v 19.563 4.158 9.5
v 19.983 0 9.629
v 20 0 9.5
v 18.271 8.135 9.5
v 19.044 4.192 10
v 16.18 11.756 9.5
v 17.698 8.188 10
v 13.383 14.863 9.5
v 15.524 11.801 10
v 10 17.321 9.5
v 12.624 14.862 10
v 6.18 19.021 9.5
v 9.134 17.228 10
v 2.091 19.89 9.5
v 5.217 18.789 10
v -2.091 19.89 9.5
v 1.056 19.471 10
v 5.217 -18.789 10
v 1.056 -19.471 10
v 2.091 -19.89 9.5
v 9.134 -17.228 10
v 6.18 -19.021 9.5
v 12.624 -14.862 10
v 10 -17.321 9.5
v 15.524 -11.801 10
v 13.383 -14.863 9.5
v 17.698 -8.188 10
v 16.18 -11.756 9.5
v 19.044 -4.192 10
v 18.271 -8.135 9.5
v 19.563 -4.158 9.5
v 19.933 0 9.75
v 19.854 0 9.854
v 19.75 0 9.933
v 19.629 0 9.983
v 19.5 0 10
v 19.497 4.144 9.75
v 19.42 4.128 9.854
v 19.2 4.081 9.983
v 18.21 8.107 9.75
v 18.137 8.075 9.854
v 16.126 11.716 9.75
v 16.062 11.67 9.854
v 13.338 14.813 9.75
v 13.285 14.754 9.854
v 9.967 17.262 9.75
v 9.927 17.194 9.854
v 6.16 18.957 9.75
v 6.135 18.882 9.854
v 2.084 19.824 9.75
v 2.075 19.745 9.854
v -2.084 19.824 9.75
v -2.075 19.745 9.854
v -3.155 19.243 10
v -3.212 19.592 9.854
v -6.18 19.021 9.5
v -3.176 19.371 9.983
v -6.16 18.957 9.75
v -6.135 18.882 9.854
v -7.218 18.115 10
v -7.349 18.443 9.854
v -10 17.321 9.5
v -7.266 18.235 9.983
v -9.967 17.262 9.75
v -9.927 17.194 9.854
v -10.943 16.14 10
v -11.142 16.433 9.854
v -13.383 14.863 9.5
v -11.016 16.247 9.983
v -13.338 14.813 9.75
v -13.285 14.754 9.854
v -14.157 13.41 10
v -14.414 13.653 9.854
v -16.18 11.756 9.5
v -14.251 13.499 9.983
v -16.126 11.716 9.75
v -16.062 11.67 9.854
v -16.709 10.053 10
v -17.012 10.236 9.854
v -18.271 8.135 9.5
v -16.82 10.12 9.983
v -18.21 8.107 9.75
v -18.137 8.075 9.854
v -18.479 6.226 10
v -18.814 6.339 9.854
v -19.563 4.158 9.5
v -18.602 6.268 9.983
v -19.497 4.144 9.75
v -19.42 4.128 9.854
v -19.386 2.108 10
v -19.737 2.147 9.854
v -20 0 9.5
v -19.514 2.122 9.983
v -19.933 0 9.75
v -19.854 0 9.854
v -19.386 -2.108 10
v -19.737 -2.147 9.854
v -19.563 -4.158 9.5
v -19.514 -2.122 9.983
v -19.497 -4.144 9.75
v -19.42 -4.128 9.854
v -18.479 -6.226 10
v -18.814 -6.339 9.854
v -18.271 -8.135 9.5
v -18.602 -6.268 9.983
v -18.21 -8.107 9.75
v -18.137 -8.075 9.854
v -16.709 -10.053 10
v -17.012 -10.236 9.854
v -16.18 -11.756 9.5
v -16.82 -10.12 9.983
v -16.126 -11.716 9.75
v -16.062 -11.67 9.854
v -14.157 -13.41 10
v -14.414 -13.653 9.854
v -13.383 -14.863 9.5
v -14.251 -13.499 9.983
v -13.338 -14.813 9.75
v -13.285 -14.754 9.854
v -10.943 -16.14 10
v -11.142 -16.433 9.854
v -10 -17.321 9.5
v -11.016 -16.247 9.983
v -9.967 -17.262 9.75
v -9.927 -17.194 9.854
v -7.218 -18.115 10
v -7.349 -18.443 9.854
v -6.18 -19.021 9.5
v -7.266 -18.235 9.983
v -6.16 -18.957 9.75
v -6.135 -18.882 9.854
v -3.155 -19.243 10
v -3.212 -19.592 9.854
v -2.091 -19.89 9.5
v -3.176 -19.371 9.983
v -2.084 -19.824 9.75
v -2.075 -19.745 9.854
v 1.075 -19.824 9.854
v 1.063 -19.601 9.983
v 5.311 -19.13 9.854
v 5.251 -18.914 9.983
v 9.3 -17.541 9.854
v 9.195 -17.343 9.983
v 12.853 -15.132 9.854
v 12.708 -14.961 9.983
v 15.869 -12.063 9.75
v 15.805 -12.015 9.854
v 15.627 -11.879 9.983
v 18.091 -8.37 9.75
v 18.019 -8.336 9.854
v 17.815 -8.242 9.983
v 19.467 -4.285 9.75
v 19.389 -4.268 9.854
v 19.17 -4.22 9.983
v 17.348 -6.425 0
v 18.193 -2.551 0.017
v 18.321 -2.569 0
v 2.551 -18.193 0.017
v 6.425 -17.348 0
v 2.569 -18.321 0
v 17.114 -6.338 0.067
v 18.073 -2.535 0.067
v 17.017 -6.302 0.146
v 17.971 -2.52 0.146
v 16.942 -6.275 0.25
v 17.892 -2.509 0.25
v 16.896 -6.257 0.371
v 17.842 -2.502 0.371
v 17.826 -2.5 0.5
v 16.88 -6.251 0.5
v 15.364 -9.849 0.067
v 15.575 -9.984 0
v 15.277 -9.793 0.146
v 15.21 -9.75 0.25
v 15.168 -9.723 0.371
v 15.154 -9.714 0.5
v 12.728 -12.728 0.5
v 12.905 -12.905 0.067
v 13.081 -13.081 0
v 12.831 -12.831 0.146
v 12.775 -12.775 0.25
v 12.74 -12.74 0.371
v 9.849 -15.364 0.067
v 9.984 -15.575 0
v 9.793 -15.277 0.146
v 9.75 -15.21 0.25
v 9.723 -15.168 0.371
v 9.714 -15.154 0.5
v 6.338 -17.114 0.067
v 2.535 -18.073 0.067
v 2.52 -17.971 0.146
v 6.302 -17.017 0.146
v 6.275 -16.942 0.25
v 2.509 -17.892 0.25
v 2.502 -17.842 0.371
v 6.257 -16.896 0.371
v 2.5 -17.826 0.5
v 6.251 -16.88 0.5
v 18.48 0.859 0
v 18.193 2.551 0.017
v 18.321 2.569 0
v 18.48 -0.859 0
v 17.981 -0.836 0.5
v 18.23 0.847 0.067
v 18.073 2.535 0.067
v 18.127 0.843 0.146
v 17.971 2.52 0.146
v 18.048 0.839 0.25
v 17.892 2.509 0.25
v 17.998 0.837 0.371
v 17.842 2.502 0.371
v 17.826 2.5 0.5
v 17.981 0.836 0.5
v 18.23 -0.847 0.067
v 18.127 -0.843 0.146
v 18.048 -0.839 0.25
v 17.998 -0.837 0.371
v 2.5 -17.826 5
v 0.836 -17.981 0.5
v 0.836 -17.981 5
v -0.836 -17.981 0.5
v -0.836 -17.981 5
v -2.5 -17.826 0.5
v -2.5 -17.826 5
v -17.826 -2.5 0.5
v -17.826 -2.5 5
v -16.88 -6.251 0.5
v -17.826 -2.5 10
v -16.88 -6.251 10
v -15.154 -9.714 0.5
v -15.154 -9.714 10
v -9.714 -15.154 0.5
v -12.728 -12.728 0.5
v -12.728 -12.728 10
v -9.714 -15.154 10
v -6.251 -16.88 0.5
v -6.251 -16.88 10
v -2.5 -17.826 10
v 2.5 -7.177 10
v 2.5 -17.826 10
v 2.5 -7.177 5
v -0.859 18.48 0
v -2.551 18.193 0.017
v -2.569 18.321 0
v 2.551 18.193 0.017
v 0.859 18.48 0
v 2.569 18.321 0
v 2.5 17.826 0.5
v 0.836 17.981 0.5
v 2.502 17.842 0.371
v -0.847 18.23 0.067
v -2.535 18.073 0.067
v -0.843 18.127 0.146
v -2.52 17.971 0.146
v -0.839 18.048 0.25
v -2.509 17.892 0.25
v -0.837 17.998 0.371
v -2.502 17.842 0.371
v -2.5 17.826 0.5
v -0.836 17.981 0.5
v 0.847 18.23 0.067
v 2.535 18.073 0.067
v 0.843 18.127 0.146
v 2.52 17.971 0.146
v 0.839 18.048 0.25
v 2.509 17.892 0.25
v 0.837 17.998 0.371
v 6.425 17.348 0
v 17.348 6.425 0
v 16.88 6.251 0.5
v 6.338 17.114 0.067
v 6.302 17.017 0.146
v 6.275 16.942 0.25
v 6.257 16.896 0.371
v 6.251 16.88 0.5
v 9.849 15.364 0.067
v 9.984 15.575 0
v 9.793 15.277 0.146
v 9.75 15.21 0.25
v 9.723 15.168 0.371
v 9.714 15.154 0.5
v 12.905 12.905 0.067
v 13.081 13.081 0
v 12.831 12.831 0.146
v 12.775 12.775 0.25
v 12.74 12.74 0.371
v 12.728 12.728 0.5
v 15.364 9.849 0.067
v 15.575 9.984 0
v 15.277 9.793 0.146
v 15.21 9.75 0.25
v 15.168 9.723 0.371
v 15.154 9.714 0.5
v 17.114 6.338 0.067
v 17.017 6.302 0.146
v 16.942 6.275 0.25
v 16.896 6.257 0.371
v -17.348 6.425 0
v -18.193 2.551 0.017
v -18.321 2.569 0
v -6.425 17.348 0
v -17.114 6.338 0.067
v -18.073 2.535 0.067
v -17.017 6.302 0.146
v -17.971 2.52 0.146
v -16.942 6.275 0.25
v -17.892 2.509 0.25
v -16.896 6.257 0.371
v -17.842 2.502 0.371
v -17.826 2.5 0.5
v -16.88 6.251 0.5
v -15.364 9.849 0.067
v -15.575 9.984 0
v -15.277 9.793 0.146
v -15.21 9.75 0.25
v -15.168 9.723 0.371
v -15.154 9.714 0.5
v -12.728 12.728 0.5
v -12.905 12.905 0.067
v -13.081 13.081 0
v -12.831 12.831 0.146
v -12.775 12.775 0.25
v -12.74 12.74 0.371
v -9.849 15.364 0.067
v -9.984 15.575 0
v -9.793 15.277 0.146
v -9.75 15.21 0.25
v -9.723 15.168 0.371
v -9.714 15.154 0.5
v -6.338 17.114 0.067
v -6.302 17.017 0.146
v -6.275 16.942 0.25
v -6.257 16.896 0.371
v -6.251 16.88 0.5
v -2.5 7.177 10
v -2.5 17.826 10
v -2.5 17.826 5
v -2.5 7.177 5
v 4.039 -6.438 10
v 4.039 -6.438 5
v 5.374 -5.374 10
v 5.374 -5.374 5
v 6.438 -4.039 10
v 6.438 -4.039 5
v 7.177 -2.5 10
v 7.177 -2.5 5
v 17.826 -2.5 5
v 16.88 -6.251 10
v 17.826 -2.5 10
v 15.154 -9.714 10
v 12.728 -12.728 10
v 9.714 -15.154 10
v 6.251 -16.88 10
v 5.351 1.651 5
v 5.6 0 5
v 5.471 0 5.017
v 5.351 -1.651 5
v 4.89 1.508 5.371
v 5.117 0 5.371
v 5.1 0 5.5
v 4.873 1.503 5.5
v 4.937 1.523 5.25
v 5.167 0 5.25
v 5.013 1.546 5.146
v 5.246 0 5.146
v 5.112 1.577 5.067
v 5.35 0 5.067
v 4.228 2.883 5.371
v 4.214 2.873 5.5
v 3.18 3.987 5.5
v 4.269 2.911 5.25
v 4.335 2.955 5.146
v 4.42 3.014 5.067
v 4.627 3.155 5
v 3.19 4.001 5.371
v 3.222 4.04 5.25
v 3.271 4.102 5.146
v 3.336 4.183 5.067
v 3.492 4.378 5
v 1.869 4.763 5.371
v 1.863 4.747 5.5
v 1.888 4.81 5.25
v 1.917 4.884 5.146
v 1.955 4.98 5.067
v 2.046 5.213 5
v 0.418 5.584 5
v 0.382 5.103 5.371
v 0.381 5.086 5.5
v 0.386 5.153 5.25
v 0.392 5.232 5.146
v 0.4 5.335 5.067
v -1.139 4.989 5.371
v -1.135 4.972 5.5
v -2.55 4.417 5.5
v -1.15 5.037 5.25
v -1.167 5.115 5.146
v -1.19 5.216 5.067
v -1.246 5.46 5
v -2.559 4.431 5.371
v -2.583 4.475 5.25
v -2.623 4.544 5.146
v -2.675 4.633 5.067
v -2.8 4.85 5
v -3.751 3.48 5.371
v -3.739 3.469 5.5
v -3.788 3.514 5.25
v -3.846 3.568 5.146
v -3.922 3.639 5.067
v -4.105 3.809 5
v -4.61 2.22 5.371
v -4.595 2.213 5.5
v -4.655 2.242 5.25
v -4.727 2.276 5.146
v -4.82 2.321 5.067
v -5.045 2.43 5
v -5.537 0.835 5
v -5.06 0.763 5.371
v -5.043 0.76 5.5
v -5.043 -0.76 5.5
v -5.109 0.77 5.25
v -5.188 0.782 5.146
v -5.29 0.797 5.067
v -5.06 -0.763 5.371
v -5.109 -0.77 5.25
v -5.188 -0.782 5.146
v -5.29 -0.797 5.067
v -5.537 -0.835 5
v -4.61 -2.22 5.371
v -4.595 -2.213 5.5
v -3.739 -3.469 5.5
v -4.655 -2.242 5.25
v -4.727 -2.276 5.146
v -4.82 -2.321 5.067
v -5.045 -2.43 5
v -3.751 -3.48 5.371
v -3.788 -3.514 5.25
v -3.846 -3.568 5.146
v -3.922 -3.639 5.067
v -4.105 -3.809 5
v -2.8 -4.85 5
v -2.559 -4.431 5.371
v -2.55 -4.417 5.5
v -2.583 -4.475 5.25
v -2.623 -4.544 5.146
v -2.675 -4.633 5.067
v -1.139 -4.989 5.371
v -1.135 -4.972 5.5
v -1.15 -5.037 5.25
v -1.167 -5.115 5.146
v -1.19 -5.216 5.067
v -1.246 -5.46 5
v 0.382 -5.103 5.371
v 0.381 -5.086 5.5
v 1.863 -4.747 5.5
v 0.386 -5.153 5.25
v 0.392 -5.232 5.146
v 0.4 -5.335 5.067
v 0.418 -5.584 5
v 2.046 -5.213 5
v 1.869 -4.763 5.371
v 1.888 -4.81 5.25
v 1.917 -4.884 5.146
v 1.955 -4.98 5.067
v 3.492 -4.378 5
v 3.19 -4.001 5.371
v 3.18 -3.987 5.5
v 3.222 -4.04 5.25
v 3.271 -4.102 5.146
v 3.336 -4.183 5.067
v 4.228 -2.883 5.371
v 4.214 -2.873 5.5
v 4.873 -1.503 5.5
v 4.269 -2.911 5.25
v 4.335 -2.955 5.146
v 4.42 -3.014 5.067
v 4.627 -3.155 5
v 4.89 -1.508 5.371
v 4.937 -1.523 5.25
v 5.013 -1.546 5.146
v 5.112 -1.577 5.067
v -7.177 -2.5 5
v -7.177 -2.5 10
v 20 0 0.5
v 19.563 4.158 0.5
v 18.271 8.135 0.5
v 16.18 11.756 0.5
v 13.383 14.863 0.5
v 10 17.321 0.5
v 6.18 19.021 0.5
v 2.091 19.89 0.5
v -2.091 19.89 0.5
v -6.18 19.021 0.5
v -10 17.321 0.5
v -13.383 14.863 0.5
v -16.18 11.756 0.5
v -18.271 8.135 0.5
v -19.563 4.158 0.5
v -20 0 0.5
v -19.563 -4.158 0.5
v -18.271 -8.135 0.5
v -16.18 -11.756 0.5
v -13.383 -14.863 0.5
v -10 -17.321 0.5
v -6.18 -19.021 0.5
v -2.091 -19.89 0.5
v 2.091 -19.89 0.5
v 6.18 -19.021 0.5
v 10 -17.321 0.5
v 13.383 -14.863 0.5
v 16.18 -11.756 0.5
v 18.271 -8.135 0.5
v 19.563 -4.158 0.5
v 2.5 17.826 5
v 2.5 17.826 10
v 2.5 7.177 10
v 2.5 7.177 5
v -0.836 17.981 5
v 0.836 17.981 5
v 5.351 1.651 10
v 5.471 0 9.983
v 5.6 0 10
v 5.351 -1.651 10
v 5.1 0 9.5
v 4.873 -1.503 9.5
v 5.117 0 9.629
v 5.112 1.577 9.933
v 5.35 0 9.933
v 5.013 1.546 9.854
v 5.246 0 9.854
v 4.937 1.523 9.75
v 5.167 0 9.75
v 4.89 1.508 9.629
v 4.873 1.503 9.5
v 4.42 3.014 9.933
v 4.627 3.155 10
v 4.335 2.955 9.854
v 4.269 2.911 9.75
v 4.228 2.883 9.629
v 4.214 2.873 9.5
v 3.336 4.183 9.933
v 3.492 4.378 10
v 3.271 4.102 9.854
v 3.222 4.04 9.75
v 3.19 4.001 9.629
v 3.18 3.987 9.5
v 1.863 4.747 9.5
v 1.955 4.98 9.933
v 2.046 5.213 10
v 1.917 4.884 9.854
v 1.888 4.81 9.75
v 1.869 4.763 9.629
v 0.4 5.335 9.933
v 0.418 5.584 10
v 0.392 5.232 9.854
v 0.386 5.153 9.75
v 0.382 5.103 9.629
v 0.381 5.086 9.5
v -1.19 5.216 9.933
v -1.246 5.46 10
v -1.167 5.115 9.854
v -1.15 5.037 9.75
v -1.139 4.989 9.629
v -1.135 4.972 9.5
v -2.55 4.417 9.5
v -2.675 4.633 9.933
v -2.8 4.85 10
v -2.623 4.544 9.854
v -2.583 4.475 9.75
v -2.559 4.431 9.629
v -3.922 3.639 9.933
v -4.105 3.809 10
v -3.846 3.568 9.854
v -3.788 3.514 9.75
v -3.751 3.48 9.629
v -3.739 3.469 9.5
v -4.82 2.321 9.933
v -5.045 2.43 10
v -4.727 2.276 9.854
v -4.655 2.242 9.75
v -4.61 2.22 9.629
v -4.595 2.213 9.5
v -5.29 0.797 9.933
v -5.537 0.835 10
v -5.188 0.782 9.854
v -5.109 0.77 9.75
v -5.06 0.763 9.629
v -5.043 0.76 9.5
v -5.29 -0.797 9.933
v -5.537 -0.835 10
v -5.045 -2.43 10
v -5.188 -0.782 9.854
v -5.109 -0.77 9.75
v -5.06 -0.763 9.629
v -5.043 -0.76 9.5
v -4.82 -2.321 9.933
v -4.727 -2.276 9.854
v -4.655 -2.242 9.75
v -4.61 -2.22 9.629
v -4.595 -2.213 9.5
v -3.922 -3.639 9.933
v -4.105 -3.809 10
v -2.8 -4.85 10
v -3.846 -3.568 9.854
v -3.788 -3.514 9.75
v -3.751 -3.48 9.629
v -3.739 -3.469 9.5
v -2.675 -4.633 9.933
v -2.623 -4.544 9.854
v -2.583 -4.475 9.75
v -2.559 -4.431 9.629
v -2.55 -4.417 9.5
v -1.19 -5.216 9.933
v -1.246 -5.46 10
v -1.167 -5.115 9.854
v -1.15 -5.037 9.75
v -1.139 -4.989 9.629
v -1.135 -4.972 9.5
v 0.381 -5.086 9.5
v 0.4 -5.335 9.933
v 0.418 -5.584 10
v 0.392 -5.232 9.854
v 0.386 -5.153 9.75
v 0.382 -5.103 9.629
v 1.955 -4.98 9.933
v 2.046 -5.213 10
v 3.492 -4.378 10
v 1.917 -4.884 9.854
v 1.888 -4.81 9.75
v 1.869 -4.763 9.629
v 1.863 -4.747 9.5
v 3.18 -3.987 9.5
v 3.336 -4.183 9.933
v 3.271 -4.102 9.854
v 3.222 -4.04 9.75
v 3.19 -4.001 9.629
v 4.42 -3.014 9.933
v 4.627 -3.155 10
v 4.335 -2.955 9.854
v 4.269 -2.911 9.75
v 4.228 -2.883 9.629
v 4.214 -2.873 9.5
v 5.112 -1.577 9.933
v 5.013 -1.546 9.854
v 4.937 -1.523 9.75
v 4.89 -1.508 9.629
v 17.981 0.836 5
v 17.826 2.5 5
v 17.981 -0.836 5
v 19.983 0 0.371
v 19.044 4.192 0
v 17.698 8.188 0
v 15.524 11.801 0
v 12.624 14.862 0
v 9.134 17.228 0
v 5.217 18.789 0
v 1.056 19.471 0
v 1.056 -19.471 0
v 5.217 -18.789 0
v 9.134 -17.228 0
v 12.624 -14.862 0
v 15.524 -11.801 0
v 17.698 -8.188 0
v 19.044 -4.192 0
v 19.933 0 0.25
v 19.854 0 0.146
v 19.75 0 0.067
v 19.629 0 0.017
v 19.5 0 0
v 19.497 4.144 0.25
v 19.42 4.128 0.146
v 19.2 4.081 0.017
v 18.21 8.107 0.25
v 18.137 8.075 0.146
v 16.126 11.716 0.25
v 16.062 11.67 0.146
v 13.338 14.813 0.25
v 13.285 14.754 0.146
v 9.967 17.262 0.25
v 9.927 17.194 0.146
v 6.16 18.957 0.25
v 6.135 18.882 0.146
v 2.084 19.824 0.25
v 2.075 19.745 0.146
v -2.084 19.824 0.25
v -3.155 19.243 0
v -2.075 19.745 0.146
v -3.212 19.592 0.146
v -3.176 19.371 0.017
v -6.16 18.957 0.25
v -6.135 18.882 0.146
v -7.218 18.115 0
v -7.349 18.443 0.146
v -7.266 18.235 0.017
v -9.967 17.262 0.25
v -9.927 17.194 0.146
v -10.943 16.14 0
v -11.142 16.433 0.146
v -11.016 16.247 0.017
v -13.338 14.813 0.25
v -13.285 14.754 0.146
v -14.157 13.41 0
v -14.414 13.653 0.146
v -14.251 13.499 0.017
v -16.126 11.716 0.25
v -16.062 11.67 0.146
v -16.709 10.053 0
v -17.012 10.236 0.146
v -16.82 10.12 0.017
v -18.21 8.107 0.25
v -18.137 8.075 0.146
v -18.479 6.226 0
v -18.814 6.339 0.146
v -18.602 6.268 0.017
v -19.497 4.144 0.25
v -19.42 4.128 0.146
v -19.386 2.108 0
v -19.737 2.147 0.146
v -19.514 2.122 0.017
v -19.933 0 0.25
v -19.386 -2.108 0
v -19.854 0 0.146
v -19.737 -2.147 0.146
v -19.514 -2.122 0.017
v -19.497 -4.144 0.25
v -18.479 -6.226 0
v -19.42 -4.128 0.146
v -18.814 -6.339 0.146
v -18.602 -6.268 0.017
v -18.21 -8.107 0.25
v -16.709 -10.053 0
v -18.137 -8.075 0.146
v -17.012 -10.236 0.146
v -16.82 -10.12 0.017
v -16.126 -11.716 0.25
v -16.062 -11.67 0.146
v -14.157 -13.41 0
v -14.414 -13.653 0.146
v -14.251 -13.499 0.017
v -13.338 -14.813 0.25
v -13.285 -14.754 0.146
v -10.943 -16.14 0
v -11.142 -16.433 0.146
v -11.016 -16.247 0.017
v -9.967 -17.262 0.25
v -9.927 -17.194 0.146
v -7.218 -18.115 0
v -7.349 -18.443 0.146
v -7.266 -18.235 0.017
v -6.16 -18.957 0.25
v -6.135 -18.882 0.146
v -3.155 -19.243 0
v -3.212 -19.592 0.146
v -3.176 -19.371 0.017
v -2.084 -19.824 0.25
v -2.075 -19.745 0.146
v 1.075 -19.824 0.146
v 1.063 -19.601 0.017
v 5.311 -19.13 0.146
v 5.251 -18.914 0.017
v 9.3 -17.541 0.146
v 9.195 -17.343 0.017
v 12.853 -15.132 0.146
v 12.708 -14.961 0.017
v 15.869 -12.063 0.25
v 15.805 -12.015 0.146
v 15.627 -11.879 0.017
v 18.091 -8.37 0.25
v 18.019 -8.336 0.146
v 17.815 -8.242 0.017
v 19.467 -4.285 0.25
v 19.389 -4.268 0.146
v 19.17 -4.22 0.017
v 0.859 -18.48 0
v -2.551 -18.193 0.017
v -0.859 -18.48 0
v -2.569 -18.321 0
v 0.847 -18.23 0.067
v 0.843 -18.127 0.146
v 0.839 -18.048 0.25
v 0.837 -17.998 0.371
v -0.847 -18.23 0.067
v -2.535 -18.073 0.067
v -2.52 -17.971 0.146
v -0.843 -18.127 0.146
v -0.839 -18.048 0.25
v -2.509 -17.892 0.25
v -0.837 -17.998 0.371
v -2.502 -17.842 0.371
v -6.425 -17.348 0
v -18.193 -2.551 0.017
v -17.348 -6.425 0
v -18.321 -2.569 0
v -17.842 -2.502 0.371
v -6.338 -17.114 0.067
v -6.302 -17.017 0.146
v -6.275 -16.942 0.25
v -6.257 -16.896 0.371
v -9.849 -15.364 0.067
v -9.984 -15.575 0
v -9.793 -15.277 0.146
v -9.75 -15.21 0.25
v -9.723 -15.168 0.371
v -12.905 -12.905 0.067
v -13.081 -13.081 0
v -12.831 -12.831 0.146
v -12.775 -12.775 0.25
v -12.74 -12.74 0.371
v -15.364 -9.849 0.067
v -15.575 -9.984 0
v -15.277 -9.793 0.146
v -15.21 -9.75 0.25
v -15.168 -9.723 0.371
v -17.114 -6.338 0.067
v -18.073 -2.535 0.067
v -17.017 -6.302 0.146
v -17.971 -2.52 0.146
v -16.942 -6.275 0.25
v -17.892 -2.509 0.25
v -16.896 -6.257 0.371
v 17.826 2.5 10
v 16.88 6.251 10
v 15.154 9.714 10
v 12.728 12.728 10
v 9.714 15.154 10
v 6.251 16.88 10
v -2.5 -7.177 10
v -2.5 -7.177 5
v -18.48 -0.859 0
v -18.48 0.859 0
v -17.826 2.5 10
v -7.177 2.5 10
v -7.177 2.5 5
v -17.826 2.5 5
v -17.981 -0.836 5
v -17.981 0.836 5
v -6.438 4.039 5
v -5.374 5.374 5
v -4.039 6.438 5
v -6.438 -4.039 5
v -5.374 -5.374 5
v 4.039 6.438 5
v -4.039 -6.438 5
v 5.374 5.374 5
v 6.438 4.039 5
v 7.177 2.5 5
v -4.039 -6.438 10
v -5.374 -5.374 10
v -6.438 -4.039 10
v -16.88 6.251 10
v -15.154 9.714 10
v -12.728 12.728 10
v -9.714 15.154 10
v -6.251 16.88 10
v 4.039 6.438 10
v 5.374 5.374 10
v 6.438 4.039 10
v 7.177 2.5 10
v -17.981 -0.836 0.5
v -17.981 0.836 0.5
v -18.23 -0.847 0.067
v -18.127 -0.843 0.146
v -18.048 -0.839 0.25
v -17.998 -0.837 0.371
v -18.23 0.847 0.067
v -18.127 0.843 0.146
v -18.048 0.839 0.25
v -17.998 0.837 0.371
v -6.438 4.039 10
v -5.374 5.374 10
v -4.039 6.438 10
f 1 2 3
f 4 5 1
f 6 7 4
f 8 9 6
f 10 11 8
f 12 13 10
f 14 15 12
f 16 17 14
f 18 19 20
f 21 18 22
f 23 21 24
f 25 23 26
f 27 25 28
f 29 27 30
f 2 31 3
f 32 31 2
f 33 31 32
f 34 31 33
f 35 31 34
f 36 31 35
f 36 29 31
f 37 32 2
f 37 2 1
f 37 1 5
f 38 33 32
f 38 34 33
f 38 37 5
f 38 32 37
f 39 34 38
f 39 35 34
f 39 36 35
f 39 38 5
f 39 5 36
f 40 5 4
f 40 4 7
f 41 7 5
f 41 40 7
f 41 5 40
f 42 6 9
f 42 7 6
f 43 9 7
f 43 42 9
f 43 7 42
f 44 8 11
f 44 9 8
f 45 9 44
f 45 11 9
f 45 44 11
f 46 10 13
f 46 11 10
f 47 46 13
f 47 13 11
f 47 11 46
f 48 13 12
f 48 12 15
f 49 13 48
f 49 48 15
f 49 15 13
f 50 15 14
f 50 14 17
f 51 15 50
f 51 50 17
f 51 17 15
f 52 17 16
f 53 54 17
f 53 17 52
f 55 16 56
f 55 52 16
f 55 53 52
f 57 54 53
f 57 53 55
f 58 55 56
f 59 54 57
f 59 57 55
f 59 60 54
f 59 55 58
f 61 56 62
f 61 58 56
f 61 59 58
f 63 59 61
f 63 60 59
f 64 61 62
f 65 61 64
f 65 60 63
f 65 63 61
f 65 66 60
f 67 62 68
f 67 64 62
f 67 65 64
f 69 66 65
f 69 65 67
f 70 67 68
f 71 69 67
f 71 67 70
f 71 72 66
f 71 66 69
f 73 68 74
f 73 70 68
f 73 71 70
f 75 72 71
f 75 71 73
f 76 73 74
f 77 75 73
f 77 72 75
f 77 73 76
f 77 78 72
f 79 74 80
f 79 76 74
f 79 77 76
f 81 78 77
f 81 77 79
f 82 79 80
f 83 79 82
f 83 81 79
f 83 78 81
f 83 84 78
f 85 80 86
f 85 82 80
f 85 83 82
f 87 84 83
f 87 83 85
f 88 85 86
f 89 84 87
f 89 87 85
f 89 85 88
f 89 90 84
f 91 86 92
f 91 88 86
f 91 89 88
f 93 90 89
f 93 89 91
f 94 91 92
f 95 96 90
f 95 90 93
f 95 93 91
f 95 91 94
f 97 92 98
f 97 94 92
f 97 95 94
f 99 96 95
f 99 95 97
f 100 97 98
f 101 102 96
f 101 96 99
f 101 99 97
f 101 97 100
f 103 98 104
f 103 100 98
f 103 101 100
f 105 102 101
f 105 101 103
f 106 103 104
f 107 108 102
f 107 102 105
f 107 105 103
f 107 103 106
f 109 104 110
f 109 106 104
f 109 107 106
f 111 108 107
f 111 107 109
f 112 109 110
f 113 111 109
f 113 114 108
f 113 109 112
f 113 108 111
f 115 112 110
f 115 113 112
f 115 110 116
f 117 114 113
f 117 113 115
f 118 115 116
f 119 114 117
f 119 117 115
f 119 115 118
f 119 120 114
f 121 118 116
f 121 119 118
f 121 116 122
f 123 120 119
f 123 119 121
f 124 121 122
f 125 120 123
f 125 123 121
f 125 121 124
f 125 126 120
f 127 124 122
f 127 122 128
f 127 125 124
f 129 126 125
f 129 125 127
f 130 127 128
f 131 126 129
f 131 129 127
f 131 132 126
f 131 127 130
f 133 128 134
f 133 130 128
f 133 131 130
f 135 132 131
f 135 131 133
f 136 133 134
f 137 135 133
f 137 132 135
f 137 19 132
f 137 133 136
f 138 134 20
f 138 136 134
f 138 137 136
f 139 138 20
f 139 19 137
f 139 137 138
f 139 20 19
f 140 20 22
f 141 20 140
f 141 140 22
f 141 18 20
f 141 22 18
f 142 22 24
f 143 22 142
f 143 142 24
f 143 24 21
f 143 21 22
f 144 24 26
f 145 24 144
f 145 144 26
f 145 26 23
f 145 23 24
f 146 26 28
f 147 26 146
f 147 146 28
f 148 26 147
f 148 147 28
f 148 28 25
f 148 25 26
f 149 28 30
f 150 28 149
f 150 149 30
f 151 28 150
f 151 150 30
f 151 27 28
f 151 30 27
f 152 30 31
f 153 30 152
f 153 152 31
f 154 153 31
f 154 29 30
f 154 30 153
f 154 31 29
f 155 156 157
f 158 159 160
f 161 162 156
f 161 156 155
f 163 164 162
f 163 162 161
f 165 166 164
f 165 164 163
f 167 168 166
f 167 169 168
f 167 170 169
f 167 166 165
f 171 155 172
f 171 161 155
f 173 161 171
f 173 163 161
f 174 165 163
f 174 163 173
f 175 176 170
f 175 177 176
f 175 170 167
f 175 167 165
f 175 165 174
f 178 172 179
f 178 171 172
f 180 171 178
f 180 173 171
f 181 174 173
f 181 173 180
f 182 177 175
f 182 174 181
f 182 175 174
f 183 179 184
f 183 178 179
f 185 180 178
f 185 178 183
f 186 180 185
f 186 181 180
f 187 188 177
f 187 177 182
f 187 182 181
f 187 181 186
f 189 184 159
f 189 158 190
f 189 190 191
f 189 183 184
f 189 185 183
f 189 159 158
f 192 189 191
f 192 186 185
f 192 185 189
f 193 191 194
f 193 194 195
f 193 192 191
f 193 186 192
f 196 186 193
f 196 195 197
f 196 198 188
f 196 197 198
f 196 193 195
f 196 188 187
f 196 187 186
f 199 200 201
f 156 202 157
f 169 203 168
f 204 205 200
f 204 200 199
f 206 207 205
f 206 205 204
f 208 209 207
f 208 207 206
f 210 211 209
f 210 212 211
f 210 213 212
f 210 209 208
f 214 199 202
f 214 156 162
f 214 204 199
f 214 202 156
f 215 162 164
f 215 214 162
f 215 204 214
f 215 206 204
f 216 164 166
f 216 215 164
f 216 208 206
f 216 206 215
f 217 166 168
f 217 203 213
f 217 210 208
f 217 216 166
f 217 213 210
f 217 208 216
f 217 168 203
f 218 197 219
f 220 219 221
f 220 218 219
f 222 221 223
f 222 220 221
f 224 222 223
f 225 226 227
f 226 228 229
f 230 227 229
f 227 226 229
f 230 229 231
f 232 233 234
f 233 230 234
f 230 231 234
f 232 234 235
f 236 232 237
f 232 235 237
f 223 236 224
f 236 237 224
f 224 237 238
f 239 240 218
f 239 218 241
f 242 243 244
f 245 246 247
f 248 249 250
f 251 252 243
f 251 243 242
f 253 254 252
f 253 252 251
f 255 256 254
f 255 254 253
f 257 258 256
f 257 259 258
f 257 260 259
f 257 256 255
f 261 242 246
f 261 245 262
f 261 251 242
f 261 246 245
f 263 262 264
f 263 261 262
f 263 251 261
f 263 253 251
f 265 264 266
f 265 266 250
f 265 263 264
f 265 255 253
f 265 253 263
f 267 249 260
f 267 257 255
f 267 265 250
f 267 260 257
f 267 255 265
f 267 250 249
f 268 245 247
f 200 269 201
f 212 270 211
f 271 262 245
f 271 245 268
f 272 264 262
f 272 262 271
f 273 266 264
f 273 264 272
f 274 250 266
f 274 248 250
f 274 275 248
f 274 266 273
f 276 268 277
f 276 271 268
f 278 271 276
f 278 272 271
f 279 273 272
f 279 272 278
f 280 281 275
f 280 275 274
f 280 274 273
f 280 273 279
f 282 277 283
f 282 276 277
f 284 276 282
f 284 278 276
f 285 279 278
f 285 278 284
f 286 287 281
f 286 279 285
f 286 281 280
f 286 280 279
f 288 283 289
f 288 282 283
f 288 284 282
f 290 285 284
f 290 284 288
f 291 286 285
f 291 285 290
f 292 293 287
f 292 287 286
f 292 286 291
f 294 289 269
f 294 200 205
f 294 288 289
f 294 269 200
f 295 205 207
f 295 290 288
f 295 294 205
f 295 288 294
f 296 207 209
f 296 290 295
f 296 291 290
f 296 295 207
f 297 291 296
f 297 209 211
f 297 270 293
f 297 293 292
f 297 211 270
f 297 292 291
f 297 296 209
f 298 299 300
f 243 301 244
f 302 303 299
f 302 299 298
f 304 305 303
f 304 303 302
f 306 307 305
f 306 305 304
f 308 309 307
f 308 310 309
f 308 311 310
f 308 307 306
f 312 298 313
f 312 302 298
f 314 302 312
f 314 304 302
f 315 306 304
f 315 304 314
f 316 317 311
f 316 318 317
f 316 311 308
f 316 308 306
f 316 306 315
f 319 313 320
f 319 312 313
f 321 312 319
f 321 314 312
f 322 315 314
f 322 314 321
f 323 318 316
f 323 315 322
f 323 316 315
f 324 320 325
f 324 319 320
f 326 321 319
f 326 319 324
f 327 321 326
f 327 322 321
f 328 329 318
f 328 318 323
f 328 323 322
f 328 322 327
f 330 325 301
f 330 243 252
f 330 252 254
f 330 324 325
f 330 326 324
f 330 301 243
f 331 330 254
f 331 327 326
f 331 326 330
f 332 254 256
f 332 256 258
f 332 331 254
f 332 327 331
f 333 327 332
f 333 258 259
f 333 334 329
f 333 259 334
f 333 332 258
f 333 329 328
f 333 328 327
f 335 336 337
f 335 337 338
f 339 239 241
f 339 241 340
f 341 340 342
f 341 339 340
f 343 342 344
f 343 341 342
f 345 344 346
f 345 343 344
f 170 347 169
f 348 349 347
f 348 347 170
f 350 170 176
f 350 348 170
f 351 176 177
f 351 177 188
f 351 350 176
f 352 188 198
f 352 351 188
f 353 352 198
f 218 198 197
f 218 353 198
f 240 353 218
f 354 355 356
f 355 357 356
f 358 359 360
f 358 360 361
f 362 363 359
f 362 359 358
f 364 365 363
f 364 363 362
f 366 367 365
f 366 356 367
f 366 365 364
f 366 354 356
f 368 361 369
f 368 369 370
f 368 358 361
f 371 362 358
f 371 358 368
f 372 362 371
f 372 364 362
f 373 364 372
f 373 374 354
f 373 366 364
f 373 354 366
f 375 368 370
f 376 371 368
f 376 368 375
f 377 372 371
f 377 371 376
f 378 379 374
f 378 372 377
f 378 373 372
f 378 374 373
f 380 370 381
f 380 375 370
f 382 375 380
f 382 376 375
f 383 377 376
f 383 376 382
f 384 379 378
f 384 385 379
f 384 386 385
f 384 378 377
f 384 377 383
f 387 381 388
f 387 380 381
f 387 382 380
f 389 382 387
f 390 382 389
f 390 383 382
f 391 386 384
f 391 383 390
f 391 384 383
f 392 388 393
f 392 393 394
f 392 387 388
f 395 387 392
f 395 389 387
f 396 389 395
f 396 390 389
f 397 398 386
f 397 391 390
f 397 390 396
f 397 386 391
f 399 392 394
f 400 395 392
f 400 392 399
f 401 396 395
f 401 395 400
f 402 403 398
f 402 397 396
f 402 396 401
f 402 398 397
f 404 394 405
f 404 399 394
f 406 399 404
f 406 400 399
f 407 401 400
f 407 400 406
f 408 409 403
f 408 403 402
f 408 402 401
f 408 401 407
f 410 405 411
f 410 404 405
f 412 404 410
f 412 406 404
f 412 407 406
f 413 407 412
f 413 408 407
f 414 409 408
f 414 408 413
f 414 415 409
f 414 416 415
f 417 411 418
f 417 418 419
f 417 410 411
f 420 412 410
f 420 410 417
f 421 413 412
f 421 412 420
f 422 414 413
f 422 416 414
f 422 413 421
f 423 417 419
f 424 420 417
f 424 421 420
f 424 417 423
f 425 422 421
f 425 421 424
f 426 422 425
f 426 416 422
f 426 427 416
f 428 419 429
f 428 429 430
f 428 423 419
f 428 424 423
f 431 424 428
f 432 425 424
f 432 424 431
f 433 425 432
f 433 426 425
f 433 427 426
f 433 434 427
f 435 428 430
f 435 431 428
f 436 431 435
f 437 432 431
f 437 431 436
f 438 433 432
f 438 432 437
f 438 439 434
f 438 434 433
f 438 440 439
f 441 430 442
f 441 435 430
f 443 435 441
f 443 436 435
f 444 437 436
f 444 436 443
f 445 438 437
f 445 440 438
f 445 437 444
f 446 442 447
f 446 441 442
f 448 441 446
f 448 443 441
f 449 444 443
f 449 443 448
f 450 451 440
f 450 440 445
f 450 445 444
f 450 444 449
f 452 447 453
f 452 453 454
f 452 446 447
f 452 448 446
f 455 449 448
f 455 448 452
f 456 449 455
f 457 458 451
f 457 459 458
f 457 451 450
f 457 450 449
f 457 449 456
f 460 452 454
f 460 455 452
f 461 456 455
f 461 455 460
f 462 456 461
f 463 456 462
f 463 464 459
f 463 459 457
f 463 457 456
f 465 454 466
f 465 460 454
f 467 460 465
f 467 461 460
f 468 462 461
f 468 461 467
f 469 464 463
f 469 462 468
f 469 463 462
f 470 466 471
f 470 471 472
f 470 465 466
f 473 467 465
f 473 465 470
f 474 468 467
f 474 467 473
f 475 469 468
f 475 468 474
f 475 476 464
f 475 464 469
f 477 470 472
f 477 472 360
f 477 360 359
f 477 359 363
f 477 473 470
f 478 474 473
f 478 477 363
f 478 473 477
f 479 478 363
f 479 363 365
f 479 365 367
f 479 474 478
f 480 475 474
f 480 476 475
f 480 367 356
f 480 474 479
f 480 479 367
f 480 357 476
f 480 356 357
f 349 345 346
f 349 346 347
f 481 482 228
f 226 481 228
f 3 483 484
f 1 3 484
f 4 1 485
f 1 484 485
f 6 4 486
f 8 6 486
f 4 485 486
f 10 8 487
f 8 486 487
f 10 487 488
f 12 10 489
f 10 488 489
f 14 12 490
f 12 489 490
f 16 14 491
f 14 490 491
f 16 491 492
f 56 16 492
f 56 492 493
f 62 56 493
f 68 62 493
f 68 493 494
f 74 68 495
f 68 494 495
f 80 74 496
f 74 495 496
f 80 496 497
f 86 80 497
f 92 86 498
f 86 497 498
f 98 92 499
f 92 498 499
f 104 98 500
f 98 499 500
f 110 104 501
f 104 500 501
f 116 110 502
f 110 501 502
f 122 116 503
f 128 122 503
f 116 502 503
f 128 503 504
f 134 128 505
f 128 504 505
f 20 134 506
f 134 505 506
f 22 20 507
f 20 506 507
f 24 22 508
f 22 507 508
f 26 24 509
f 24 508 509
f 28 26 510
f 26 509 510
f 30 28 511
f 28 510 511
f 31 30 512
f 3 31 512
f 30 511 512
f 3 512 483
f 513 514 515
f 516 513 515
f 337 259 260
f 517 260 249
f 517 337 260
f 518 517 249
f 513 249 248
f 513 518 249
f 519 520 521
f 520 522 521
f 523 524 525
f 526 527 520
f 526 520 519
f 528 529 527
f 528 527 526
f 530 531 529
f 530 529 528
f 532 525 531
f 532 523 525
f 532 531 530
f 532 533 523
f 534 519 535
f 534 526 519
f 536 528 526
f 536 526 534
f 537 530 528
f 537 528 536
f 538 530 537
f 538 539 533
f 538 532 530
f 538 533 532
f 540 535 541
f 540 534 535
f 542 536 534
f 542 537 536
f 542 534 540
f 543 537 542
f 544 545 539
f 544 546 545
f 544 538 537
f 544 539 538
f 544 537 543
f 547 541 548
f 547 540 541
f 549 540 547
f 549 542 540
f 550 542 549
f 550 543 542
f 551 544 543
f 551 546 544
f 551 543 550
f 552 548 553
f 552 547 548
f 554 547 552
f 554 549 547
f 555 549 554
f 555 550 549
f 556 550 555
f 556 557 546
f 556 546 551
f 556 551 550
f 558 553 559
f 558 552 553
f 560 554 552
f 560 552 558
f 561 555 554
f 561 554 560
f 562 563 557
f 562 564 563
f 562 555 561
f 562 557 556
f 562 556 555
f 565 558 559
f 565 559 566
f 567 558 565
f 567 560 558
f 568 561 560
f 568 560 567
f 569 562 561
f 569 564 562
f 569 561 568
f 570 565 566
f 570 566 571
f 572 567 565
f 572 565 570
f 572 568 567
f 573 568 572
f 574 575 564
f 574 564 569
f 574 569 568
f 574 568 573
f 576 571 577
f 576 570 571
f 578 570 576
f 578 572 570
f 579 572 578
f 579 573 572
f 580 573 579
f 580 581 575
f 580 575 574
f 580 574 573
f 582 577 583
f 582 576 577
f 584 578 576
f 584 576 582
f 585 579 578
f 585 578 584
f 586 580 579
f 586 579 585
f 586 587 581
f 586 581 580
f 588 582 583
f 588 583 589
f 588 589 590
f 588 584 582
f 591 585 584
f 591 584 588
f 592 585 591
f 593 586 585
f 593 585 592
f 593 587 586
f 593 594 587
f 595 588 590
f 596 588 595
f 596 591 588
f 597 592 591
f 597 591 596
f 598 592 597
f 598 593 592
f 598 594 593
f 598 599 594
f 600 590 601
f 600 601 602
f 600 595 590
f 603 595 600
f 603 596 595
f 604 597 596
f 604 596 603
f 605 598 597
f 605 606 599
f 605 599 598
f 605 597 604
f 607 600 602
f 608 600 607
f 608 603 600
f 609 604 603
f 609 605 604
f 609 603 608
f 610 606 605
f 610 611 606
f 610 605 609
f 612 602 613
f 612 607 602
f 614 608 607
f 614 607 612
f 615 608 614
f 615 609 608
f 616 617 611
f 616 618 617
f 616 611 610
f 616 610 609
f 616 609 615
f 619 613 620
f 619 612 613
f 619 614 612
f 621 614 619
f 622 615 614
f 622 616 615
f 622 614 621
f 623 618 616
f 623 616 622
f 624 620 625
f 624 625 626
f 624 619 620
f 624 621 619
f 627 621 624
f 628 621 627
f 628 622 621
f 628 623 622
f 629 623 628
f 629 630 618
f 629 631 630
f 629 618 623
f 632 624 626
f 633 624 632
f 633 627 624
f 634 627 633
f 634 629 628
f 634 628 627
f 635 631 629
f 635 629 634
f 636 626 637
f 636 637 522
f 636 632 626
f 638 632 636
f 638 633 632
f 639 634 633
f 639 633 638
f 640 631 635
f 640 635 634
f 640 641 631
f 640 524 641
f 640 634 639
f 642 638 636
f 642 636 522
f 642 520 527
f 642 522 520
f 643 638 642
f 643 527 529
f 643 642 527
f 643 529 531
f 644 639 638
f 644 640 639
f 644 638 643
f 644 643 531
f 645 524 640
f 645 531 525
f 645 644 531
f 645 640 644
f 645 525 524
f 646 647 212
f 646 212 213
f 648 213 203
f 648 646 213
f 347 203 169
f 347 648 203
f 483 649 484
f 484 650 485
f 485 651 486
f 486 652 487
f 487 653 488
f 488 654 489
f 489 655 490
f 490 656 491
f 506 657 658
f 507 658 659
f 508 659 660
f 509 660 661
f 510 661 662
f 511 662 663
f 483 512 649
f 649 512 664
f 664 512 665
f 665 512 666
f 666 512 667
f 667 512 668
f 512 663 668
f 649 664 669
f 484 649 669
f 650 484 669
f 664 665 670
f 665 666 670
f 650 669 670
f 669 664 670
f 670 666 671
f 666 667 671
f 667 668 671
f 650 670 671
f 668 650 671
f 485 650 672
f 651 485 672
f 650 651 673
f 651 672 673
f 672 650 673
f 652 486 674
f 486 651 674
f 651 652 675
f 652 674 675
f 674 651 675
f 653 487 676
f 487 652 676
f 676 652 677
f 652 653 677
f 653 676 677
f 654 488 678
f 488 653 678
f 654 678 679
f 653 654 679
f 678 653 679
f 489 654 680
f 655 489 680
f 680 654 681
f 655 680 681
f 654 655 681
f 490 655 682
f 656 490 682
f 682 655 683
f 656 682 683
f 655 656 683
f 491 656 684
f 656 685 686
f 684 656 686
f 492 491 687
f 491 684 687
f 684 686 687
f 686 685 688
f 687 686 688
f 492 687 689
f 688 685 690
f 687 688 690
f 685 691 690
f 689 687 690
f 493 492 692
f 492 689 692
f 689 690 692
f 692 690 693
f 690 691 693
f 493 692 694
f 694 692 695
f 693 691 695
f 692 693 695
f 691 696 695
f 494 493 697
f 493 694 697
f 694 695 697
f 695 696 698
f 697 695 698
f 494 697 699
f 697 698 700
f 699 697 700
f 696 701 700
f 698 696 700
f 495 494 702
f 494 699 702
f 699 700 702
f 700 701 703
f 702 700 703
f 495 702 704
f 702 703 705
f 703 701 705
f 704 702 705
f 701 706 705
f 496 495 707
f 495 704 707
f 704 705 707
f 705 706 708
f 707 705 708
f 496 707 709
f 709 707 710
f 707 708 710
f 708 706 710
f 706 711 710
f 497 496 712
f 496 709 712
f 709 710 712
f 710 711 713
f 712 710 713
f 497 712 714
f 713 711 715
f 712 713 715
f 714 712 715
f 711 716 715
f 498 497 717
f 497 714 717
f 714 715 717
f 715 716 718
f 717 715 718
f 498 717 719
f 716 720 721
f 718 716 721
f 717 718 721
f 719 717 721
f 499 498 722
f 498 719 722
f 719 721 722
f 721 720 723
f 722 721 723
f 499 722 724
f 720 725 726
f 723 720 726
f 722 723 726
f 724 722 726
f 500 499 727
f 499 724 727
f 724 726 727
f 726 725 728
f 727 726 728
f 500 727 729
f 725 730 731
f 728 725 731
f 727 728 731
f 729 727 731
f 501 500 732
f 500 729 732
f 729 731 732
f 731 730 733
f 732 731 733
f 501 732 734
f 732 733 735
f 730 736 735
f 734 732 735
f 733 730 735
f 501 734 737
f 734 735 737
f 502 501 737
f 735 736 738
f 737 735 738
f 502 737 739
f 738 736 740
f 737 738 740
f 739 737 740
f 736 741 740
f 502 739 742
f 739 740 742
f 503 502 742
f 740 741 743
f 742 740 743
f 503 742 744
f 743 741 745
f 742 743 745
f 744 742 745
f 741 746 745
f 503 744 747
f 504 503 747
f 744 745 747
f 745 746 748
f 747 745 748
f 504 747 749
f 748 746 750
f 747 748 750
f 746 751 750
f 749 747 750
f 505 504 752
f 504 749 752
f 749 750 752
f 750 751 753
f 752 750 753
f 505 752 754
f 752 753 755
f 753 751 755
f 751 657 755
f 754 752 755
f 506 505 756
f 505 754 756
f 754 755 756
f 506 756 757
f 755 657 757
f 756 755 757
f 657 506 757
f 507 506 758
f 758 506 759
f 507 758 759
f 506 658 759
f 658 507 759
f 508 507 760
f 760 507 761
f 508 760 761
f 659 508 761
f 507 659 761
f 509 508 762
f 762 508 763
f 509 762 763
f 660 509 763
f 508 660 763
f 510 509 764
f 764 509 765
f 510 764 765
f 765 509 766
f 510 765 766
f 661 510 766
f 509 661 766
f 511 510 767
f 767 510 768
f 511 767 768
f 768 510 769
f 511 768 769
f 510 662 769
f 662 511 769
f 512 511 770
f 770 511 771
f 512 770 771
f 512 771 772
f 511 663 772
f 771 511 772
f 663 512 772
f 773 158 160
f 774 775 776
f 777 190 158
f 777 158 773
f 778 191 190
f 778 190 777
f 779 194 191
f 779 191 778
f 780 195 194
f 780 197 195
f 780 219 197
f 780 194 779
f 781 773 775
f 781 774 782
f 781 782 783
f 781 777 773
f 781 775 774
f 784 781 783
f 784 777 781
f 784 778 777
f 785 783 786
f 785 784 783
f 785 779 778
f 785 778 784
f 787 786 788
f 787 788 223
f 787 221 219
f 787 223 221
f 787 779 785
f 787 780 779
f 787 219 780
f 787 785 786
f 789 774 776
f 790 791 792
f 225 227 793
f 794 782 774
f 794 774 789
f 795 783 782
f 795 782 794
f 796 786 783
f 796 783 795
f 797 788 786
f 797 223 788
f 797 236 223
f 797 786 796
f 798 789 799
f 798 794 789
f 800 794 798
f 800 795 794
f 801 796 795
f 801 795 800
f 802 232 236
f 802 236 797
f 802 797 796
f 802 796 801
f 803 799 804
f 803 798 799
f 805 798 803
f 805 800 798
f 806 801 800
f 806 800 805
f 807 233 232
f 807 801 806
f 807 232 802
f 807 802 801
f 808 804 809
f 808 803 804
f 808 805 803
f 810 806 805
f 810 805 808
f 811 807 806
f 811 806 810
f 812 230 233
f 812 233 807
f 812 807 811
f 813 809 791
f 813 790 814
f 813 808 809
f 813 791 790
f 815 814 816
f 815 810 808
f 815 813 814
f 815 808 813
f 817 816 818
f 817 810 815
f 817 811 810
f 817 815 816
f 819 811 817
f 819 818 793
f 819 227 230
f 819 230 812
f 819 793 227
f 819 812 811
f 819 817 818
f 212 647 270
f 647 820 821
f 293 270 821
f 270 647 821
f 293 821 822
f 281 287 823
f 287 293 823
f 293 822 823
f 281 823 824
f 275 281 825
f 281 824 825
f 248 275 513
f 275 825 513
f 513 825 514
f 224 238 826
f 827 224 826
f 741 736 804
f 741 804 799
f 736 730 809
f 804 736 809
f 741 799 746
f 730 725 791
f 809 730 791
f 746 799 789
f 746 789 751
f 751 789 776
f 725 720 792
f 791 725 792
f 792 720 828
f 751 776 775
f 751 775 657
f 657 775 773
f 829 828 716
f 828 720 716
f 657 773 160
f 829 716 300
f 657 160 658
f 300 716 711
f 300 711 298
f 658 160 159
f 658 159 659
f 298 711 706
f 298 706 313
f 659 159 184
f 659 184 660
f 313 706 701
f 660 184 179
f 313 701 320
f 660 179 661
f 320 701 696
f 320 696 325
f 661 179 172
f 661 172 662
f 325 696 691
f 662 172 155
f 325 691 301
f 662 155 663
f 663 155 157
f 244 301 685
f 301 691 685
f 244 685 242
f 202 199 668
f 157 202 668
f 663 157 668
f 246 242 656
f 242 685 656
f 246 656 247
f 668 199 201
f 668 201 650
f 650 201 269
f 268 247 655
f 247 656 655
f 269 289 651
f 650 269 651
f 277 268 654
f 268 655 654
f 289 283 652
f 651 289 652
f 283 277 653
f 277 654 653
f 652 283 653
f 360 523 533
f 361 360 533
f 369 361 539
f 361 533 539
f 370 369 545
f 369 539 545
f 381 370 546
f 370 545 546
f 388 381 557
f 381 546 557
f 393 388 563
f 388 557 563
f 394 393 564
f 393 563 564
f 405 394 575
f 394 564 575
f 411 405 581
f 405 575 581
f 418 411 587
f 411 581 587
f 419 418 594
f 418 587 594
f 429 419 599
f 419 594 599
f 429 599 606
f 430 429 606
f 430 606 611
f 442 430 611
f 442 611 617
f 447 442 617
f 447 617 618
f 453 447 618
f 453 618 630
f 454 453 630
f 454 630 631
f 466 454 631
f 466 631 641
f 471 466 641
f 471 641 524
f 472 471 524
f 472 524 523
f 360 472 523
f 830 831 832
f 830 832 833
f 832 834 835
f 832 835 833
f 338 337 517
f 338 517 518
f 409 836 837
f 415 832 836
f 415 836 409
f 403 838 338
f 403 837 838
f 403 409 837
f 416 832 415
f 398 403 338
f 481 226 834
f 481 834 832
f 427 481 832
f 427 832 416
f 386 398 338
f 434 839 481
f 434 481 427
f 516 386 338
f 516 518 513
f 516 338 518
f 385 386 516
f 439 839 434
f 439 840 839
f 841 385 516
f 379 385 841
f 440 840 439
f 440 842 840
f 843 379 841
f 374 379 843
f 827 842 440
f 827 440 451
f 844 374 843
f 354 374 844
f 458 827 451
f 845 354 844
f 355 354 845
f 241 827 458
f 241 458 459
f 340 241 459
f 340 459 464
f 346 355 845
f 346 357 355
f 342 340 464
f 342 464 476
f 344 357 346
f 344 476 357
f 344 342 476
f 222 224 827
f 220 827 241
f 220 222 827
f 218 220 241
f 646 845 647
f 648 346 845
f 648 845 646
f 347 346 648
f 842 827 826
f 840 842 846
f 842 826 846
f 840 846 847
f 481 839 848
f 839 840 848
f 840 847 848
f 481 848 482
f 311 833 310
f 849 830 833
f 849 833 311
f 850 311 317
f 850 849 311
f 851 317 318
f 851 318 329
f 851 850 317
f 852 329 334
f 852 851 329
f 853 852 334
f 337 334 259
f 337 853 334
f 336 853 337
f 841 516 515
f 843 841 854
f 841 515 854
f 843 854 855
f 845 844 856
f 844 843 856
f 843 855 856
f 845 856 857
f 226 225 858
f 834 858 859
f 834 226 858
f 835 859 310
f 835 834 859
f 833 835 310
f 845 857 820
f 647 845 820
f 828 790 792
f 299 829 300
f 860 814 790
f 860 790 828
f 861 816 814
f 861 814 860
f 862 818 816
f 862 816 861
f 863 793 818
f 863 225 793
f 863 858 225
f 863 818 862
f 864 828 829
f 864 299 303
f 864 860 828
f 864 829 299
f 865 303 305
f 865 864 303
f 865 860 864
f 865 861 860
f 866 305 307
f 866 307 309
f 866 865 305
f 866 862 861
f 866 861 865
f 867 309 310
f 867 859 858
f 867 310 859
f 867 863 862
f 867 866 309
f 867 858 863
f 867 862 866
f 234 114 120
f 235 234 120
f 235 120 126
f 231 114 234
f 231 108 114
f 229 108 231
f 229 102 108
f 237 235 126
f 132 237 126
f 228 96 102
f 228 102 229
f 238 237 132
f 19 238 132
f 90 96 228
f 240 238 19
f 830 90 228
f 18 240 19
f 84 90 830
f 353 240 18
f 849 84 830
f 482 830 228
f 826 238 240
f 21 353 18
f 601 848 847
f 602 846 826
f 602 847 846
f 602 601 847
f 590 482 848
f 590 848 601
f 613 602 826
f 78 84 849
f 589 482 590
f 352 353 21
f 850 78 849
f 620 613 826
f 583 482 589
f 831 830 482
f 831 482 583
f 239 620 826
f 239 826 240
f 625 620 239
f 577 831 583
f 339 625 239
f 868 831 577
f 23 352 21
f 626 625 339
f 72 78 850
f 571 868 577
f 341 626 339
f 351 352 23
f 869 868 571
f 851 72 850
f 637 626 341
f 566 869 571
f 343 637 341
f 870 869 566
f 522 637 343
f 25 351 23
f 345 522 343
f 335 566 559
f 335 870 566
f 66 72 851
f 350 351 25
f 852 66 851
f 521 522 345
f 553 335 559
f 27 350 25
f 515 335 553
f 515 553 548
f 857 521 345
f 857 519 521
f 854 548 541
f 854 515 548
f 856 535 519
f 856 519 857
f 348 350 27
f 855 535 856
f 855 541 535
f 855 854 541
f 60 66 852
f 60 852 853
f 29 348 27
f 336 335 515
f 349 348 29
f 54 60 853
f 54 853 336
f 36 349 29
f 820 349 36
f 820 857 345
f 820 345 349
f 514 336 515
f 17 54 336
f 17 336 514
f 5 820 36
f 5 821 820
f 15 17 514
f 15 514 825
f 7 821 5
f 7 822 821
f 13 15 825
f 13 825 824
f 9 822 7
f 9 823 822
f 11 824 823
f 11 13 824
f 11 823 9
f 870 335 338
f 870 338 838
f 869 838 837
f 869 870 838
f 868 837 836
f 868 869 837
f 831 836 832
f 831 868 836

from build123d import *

# Parameters (mm, degrees)
SKETCH2_R           = 20
BOSS_EXTRUDE1_DEPTH = 10
SKETCH4_R           = 5.1
CUT_EXTRUDE1_DEPTH  = 31
CUT_EXTRUDE2_START  = -5
SKETCH5_R           = 18
CUT_EXTRUDE2_DEPTH  = 5
FILLET1_R           = 0.5


with BuildPart() as part:
    # Sketch2 → Boss-Extrude1 (new body)
    with BuildSketch(Plane.XY):
        Circle(SKETCH2_R)
    extrude(amount=BOSS_EXTRUDE1_DEPTH)

    # Sketch4 → Cut-Extrude1 (cut, through all)
    with BuildSketch(Plane.XY.offset(10)):
        Circle(SKETCH4_R)
        with BuildLine():
            Line((-2.5, 17.82554347), (-2.5, 7.177046746))
            ThreePointArc((-2.5, 7.177046746), (-5.374011537, 5.374011537), (-7.177046746, 2.5))
            Line((-7.177046746, 2.5), (-17.82554347, 2.5))
            ThreePointArc((-17.82554347, 2.5), (-12.727922061, 12.727922061), (-2.5, 17.82554347))
        make_face()
        with BuildLine():
            Line((2.5, 17.82554347), (2.5, 7.177046746))
            ThreePointArc((2.5, 7.177046746), (5.374011537, 5.374011537), (7.177046746, 2.5))
            Line((7.177046746, 2.5), (17.82554347, 2.5))
            ThreePointArc((17.82554347, 2.5), (12.727922061, 12.727922061), (2.5, 17.82554347))
        make_face()
        with BuildLine():
            Line((7.177046746, -2.5), (17.82554347, -2.5))
            ThreePointArc((17.82554347, -2.5), (12.727922061, -12.727922061), (2.5, -17.82554347))
            Line((2.5, -17.82554347), (2.5, -7.177046746))
            ThreePointArc((2.5, -7.177046746), (5.374011537, -5.374011537), (7.177046746, -2.5))
        make_face()
        with BuildLine():
            Line((-7.177046746, -2.5), (-17.82554347, -2.5))
            ThreePointArc((-17.82554347, -2.5), (-12.727922061, -12.727922061), (-2.5, -17.82554347))
            Line((-2.5, -17.82554347), (-2.5, -7.177046746))
            ThreePointArc((-2.5, -7.177046746), (-5.374011537, -5.374011537), (-7.177046746, -2.5))
        make_face()
    extrude(amount=-CUT_EXTRUDE1_DEPTH, mode=Mode.SUBTRACT)

    # Sketch5 → Cut-Extrude2 (cut)
    with BuildSketch(Plane(origin=(0, 0, 0), x_dir=(-1, 0, 0), z_dir=(0, 0, -1)).offset(CUT_EXTRUDE2_START)):
        with Locations(Location((0, 0, 0), (0, 0, 172.016443854))):
            Circle(SKETCH5_R)
    extrude(amount=CUT_EXTRUDE2_DEPTH, mode=Mode.SUBTRACT)

    # Fillet1
    fillet1_edges = [part.edges().sort_by_distance(p)[0] for p in [
        (-20, 0, 0),
        (-18, 0, 0),
        (-5.1, 0, 10),
        (-20, 0, 10),
        (-5.1, 0, 5),
    ]]
    fillet(fillet1_edges, radius=FILLET1_R)


solid = part.part
